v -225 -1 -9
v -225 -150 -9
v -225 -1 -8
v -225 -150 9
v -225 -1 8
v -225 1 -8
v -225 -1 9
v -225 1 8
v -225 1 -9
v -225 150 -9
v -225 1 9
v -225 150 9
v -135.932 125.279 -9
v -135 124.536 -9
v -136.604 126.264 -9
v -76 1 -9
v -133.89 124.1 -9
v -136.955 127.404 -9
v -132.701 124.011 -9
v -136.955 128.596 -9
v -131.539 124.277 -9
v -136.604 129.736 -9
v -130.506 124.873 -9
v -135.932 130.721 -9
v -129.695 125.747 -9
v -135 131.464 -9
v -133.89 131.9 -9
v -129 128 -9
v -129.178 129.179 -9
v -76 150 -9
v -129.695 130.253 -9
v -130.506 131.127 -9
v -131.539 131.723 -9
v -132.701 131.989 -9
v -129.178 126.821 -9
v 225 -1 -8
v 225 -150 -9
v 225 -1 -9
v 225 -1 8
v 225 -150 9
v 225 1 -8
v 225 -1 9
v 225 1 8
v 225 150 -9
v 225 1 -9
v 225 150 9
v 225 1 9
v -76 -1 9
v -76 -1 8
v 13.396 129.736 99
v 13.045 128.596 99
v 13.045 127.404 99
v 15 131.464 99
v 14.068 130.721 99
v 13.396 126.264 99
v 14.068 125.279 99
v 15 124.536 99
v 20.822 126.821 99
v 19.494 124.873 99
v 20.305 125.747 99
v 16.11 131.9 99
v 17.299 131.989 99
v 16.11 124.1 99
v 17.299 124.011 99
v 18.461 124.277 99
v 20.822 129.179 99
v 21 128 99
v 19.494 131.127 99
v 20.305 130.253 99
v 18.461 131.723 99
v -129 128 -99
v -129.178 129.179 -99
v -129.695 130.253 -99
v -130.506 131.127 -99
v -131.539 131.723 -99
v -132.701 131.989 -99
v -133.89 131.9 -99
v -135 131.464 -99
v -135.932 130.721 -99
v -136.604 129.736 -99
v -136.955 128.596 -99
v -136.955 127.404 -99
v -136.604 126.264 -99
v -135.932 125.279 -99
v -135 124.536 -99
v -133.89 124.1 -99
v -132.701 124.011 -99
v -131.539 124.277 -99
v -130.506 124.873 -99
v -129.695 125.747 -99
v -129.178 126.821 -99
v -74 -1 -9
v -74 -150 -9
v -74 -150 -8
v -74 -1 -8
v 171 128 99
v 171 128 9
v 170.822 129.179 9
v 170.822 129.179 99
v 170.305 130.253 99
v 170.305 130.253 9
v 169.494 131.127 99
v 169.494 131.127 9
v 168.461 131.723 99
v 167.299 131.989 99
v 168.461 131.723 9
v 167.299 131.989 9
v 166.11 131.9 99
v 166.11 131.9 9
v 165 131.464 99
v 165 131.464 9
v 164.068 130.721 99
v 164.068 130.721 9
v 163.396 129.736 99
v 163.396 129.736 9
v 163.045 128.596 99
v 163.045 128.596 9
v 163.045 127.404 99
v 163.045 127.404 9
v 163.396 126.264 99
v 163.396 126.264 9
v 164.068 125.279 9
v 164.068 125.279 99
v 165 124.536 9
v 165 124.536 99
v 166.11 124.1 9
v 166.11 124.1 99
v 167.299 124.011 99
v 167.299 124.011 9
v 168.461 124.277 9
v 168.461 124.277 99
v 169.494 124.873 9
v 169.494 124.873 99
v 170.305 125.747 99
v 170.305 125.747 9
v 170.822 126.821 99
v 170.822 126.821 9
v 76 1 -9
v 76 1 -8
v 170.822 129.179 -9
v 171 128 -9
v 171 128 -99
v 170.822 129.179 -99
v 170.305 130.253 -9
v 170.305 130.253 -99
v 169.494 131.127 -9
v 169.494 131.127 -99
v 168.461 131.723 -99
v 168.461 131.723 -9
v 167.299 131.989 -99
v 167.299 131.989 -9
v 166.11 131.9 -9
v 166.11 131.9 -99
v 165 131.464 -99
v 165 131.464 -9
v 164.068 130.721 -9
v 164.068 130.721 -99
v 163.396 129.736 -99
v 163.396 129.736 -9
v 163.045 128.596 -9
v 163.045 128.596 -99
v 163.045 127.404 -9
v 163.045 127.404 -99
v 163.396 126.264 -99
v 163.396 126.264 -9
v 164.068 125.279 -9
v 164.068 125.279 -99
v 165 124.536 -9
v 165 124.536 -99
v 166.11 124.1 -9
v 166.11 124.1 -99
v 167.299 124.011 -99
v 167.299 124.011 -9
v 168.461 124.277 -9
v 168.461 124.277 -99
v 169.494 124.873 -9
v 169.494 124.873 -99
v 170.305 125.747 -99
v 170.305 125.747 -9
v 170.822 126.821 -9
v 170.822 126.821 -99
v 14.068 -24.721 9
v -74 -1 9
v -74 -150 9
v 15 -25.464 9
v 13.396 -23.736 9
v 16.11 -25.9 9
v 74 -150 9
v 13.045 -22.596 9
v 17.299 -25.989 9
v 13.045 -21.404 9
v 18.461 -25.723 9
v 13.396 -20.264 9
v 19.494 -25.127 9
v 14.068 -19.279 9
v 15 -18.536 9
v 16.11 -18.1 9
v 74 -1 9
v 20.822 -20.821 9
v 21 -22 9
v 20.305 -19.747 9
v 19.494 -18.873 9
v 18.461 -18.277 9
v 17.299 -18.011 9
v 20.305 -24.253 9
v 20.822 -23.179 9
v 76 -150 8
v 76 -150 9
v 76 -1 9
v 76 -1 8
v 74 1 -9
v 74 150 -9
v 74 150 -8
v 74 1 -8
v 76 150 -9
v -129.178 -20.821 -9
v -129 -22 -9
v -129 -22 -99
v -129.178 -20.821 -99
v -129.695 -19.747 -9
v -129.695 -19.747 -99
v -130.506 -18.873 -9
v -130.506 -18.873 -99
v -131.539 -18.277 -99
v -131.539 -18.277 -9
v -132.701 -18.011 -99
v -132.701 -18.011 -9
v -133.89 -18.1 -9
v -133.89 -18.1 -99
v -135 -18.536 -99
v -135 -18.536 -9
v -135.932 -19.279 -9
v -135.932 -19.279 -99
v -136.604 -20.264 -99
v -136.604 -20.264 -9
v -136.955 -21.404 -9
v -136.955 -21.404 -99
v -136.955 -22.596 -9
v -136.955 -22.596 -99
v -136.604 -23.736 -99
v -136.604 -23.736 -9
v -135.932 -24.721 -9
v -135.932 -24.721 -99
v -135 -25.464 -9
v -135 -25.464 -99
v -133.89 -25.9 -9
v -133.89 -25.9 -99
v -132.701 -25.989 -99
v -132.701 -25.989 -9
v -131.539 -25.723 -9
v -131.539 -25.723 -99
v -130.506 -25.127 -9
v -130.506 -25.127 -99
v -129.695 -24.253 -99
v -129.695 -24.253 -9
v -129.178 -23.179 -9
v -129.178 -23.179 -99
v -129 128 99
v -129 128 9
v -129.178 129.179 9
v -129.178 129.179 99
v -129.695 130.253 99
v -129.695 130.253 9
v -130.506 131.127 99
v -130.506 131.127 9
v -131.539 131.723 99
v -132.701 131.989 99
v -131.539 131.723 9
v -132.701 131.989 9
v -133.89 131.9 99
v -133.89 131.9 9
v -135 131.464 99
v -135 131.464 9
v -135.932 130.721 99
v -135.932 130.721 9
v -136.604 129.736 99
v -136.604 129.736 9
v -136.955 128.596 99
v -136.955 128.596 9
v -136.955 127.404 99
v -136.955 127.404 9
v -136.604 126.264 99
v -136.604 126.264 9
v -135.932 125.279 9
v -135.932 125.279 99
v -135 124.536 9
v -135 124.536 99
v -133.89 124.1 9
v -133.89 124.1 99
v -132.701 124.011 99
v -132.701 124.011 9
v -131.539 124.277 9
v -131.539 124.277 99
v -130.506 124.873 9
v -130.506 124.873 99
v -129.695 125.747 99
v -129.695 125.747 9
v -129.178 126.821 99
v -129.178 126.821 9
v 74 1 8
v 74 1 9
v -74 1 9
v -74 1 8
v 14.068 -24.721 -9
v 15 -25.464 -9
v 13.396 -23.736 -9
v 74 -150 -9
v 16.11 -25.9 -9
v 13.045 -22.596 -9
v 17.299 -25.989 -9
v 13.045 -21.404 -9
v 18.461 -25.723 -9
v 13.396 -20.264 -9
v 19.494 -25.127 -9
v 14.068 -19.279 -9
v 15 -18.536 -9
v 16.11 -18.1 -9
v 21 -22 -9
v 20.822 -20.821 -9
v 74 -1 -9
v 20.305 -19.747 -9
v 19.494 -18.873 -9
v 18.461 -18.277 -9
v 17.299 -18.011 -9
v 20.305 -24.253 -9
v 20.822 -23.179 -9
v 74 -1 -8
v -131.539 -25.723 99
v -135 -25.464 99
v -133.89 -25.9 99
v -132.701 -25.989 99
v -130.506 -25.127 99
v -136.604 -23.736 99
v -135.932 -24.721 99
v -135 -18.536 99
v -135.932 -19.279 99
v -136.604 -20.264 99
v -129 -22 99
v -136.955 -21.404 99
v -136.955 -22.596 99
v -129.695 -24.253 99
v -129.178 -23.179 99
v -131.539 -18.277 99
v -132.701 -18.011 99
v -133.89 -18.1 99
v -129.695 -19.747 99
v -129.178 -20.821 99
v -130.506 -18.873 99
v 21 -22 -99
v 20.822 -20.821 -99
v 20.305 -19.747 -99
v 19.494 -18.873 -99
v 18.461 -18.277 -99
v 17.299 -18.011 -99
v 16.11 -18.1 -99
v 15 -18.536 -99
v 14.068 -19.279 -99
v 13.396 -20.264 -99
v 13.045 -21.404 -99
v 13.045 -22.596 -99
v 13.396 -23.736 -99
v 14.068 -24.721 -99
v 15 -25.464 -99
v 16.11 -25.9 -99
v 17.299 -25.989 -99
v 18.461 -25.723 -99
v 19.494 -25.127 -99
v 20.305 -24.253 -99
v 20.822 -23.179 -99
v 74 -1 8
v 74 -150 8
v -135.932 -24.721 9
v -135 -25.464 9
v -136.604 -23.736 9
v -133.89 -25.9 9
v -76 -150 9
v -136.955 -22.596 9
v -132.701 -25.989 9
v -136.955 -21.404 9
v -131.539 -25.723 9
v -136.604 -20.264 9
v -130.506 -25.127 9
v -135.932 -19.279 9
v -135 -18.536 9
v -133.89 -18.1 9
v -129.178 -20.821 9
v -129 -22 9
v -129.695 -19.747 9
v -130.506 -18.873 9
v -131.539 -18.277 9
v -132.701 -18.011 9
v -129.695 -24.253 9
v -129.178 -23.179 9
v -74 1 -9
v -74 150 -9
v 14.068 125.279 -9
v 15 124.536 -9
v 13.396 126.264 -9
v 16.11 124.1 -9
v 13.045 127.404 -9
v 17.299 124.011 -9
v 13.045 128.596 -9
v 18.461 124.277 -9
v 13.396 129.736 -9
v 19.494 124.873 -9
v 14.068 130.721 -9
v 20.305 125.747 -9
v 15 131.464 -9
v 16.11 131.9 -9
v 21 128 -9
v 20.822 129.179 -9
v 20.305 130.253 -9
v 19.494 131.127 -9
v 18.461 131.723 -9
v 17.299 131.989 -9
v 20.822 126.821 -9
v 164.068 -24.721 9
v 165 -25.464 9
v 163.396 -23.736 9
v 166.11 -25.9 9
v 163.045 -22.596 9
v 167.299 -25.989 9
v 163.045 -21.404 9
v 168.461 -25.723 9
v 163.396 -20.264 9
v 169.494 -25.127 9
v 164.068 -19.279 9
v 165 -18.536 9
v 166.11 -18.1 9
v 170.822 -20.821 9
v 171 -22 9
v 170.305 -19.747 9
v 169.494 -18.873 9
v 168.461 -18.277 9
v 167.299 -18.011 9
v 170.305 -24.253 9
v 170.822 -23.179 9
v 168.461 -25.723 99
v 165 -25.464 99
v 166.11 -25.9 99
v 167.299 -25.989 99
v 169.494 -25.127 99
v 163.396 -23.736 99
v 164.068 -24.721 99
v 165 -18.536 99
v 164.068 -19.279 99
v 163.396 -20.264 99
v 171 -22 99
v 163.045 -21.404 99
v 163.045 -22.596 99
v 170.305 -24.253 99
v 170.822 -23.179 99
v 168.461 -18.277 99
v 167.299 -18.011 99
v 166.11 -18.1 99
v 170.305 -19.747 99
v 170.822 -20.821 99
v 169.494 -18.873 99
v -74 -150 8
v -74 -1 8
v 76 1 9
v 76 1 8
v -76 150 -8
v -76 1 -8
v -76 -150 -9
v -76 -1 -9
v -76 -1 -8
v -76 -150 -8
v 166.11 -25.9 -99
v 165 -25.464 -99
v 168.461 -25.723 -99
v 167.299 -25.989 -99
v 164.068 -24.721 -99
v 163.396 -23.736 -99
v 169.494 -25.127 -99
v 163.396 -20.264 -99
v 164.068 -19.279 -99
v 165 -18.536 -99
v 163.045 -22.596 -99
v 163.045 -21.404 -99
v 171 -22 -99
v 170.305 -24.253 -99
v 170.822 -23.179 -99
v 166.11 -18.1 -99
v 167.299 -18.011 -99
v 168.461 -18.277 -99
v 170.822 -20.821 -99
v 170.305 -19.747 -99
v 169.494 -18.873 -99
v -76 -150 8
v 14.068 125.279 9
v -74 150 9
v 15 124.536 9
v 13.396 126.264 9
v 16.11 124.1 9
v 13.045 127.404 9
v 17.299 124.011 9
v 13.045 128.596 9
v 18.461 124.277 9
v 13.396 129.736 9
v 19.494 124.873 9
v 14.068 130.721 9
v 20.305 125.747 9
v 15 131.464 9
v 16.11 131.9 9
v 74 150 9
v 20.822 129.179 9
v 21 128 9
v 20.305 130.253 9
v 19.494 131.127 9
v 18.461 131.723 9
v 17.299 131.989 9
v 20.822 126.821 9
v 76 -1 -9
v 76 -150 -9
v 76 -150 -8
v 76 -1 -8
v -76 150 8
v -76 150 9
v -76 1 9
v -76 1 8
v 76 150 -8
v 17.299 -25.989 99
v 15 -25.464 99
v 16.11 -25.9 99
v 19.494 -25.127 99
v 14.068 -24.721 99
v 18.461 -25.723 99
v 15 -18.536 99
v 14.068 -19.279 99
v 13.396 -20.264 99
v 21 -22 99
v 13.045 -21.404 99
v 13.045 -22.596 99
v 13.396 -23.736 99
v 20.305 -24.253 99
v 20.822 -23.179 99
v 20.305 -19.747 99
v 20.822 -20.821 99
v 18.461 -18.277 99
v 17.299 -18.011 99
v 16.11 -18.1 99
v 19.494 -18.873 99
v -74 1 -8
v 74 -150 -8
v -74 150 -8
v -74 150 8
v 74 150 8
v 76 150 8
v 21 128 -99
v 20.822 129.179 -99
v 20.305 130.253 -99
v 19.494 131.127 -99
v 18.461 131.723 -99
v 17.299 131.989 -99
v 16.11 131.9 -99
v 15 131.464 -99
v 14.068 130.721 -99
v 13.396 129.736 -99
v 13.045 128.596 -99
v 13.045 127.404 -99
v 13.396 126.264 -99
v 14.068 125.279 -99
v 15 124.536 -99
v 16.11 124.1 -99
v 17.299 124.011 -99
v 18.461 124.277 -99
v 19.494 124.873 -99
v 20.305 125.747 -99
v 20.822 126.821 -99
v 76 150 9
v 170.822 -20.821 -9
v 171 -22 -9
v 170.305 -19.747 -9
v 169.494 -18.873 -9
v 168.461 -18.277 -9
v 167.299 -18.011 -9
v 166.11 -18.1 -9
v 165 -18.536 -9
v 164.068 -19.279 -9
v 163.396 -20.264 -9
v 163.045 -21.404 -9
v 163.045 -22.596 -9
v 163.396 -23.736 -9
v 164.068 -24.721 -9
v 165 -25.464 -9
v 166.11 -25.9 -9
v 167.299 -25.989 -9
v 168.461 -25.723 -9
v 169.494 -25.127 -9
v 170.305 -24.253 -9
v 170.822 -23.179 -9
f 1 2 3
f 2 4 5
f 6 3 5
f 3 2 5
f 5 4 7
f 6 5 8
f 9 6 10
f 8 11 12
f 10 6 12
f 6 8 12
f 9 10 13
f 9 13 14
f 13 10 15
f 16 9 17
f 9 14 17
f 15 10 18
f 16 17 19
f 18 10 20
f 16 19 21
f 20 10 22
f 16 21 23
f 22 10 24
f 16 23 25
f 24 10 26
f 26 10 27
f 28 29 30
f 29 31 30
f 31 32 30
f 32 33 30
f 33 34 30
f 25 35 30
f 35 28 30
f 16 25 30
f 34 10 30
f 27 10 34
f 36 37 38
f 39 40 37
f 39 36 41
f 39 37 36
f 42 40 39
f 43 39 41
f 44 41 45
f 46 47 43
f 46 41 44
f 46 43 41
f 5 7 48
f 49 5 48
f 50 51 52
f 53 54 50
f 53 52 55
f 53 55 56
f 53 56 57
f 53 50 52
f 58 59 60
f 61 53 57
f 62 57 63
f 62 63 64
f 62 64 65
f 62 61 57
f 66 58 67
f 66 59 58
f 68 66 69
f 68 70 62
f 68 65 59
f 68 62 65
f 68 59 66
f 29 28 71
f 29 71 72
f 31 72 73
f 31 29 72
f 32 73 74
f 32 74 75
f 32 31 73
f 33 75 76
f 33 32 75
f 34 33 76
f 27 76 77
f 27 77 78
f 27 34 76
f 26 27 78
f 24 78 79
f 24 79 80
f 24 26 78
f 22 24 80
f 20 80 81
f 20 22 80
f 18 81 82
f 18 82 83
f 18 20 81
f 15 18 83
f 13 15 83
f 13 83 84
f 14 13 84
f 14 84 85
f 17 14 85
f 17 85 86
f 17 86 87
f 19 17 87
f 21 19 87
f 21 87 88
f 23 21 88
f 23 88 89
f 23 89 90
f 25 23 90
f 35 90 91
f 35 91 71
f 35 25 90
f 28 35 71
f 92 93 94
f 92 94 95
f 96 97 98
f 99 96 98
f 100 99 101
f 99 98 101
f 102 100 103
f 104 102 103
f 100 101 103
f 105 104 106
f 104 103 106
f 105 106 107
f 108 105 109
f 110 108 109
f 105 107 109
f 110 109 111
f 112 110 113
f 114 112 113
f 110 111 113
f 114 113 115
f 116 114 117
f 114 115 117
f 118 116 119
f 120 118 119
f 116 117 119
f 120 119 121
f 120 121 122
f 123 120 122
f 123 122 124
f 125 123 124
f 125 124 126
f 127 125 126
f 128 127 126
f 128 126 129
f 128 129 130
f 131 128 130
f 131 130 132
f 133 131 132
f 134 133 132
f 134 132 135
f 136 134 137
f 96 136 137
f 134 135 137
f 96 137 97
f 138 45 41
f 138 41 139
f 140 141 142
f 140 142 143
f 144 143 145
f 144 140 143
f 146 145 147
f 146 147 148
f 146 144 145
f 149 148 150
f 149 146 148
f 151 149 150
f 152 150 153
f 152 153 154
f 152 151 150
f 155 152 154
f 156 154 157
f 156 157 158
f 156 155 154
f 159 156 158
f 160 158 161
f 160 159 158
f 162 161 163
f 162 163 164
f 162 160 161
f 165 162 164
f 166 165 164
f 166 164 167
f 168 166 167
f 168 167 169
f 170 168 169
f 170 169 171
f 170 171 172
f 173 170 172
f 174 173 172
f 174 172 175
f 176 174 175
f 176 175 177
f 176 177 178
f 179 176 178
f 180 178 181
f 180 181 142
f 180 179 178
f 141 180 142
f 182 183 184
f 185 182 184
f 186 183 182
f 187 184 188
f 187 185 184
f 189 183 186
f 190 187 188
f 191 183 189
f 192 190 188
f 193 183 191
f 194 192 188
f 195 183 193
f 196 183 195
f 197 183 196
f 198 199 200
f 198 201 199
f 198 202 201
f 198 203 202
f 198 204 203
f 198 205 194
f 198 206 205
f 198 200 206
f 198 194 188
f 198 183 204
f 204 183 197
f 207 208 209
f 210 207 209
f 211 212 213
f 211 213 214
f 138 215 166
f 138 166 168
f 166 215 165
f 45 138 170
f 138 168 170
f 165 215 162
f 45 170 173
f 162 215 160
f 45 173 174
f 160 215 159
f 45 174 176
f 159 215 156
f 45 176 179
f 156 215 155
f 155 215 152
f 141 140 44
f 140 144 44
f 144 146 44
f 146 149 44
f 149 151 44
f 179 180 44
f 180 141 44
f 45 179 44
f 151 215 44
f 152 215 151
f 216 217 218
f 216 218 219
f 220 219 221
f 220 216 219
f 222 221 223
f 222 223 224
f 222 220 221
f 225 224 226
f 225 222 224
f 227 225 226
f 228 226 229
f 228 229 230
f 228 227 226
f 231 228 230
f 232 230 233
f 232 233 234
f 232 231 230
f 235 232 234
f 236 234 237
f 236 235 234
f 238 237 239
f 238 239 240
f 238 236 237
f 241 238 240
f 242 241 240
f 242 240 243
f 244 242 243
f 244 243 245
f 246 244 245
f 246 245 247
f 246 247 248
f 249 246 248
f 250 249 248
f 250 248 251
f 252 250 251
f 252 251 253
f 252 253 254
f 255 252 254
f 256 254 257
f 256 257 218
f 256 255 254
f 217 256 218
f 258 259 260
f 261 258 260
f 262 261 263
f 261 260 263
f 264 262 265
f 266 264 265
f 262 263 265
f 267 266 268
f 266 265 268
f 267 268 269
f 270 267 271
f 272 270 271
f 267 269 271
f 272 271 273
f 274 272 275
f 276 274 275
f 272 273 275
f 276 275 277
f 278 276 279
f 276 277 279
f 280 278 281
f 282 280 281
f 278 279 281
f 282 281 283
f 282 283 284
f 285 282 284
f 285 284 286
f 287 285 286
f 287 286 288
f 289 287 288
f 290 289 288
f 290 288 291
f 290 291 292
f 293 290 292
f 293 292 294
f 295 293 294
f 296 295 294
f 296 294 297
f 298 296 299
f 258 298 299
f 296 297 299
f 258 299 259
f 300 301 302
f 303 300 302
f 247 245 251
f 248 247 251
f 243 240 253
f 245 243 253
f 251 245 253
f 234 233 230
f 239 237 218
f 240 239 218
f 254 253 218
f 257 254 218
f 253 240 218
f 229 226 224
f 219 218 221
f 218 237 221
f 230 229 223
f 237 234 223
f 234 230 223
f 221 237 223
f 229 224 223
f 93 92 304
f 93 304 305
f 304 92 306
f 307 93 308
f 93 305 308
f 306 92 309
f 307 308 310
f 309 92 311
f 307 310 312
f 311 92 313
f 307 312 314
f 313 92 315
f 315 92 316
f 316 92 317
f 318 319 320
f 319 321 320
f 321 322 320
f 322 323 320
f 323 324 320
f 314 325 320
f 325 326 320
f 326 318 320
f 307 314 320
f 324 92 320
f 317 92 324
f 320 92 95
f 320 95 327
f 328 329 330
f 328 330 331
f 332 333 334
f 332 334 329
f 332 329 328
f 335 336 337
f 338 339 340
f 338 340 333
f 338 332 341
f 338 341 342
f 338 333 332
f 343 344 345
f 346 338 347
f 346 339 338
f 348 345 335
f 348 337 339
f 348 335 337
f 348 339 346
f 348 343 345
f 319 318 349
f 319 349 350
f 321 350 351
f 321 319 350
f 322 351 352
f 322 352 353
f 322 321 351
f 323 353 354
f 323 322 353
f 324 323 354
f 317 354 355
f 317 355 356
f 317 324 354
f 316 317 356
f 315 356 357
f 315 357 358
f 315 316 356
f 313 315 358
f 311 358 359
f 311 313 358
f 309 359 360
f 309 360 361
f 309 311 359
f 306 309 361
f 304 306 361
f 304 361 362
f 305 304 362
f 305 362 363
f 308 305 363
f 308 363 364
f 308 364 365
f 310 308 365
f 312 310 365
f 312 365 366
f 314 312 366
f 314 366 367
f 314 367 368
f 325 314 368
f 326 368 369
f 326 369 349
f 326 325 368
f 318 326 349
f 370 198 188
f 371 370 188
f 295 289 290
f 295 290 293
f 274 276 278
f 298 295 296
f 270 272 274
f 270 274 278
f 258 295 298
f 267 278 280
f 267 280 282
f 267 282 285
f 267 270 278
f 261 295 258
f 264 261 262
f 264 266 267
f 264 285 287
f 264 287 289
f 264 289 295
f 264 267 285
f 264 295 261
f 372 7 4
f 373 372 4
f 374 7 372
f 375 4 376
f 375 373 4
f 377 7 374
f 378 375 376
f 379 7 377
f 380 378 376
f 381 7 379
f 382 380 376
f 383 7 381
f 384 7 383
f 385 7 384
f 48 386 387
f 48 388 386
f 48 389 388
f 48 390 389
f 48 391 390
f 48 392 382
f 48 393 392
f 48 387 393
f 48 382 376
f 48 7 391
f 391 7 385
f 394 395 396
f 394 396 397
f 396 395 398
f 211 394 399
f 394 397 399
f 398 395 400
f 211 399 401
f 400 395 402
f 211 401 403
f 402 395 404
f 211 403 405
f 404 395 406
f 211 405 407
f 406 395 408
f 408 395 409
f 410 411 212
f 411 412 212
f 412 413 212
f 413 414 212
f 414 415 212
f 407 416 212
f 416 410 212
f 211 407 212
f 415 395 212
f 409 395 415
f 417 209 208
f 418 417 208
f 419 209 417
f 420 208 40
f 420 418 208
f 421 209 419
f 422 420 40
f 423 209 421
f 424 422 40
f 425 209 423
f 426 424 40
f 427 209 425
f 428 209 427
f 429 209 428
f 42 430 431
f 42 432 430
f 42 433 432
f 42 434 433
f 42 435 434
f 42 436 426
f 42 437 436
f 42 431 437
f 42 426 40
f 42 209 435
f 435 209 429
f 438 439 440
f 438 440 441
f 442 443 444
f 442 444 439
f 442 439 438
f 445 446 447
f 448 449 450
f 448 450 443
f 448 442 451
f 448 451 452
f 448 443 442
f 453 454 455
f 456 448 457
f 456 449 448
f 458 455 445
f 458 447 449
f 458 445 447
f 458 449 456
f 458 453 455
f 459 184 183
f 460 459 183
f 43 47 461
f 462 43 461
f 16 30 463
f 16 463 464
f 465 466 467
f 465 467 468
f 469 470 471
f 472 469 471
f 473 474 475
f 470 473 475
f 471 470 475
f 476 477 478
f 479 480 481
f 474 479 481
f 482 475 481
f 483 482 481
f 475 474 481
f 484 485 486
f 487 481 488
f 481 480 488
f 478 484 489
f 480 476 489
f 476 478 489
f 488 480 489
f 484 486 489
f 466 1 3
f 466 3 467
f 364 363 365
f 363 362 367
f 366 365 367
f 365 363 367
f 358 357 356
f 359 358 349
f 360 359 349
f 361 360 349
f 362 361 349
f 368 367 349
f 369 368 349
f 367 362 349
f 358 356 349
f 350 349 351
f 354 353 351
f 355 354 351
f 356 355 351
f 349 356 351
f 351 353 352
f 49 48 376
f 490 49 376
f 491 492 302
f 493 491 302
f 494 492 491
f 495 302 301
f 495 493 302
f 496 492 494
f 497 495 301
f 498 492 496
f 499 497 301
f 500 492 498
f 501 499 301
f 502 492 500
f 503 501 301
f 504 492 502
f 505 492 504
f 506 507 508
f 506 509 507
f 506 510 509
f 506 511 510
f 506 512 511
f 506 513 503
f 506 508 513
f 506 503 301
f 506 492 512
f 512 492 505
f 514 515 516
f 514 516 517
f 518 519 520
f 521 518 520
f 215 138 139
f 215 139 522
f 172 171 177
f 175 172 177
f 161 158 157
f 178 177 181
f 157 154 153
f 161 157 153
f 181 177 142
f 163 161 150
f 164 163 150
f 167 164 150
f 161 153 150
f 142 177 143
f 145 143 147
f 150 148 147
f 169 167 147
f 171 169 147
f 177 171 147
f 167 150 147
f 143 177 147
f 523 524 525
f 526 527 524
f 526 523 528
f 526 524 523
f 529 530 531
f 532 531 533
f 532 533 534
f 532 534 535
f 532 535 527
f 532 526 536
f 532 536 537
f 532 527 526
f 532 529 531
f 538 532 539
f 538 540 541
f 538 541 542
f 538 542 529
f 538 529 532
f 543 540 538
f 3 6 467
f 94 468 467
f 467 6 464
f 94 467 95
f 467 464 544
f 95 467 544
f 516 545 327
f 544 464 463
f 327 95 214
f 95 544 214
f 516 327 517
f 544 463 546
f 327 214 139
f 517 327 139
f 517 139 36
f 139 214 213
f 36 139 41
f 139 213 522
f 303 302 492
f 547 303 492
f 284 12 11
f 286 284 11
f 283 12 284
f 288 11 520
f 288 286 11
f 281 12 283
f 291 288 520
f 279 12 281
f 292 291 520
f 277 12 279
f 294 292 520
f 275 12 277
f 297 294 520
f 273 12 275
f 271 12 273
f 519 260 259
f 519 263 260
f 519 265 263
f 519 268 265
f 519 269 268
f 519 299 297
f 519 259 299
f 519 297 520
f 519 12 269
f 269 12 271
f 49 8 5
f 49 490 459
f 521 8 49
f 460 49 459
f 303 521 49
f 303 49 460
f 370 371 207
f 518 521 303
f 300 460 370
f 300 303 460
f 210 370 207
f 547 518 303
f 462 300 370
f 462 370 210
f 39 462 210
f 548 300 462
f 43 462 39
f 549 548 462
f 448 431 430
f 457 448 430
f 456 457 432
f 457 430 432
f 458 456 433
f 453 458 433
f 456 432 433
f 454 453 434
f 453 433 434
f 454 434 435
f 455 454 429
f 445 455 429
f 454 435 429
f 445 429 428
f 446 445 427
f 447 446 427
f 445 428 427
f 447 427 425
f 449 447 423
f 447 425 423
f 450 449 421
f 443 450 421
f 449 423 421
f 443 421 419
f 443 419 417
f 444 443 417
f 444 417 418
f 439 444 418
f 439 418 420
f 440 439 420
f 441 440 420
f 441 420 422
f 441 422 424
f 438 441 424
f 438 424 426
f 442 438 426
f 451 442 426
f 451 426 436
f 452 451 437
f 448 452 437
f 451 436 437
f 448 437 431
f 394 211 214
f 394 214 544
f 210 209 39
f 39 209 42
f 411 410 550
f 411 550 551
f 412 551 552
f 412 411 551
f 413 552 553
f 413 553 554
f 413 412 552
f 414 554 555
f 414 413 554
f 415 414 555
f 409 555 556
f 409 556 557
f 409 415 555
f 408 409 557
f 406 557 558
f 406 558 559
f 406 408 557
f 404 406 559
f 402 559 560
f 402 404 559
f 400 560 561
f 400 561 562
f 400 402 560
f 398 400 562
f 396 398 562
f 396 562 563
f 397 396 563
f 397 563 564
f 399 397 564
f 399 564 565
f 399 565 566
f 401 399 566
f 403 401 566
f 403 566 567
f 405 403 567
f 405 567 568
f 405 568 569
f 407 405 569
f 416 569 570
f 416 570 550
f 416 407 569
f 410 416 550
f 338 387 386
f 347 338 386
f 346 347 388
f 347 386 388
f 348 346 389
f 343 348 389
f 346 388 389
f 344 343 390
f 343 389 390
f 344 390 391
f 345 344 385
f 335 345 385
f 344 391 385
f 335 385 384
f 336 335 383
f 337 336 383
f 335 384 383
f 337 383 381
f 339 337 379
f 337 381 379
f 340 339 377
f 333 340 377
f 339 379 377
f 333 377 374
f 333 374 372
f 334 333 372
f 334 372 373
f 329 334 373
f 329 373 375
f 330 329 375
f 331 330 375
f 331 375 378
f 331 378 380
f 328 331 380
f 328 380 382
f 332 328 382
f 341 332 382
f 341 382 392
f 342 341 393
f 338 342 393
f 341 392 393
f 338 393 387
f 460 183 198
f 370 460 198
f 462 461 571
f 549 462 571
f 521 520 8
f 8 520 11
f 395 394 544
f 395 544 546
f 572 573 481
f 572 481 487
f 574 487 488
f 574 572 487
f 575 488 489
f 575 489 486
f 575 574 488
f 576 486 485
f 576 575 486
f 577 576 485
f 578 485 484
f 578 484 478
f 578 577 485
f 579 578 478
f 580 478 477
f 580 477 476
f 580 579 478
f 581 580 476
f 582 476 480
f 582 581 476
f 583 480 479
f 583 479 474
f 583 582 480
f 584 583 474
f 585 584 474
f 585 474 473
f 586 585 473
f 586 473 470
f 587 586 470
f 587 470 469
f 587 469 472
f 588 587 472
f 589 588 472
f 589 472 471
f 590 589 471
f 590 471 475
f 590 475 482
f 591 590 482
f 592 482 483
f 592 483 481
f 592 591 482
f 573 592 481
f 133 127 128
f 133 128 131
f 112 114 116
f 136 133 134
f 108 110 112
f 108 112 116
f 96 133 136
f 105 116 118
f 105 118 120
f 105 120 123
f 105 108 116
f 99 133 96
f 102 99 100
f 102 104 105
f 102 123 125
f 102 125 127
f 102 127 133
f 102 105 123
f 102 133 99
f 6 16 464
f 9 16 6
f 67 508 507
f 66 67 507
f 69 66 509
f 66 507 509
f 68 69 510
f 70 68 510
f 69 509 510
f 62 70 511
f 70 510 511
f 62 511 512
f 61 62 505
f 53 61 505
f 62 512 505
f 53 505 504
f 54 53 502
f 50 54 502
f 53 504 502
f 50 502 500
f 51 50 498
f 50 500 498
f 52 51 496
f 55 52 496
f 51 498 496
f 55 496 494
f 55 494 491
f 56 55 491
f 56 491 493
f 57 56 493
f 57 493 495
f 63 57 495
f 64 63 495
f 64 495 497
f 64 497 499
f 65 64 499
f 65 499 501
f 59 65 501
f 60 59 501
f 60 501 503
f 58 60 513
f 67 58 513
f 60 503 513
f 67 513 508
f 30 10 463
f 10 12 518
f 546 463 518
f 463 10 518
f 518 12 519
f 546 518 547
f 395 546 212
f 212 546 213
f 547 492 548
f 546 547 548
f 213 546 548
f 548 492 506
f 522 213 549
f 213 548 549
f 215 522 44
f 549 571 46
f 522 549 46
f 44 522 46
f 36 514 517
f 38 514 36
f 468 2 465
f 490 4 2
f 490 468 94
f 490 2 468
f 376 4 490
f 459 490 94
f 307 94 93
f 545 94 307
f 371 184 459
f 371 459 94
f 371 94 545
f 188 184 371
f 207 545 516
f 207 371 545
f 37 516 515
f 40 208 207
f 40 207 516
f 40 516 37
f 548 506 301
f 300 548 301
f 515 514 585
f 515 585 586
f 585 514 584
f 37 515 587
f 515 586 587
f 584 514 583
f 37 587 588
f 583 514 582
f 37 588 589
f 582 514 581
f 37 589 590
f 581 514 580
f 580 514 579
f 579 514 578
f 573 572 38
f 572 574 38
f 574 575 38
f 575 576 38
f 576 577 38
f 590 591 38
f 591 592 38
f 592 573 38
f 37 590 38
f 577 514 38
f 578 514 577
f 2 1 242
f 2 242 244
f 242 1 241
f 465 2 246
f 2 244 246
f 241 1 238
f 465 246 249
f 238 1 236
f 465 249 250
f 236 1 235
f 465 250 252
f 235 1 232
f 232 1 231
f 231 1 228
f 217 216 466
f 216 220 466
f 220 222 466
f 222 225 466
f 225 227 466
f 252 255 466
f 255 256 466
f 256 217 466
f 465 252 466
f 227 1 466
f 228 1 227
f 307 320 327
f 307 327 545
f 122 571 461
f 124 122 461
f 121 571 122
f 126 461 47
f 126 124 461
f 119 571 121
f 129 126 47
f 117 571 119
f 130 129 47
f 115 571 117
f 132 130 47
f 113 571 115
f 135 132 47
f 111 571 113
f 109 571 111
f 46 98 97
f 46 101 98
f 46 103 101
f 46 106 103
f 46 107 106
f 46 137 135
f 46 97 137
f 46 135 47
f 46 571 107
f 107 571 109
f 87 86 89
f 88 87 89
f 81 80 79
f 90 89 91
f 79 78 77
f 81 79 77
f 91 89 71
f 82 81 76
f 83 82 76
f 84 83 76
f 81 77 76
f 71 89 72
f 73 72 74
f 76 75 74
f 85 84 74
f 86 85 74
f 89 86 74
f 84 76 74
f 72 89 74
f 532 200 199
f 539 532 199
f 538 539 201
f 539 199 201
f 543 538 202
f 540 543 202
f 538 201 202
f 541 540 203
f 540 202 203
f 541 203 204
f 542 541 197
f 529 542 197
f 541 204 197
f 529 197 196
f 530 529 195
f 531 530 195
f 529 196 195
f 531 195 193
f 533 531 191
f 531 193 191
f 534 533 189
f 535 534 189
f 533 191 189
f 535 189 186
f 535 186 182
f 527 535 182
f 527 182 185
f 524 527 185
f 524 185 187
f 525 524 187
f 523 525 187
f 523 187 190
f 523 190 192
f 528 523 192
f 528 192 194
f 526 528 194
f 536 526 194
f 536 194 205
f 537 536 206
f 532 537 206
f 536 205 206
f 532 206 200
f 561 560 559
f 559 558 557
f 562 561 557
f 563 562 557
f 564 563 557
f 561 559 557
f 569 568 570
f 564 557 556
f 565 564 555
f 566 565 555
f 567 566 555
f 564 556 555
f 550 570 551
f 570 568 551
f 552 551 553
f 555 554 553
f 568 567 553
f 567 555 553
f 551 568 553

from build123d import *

# Parameters (mm, degrees)
SKETCH1_W           = 450
SKETCH1_H           = 300
BOSS_EXTRUDE1_DEPTH = 9
CUT_EXTRUDE2_DEPTH  = 1
SKETCH5_R           = 4
BOSS_EXTRUDE3_DEPTH = 90


with BuildPart() as part:
    # Sketch1 → Boss-Extrude1 (new, symmetric)
    with BuildSketch(Plane.XY):
        Rectangle(SKETCH1_W, SKETCH1_H)
    extrude(amount=BOSS_EXTRUDE1_DEPTH, both=True)

    # Sketch3 → Cut-Extrude2 (cut)
    with BuildSketch(Plane.XY.offset(9)):
        Polygon((-225, 1), (-225, -1), (-76, -1), (-76, -150), (-74, -150), (-74, -1), (74, -1), (74, -150), (76, -150), (76, -1), (225, -1), (225, 1), (76, 1), (76, 150), (74, 150), (74, 1), (-74, 1), (-74, 150), (-76, 150), (-76, 1), align=None)
    cut_extrude2 = extrude(amount=-CUT_EXTRUDE2_DEPTH, mode=Mode.SUBTRACT)

    # Sketch5 → Boss-Extrude3 (add)
    with BuildSketch(Plane.XY.offset(9)):
        with Locations((-133, 128)):
            Circle(SKETCH5_R)
        with Locations((17, 128)):
            Circle(SKETCH5_R)
        with Locations((167, 128)):
            Circle(SKETCH5_R)
        with Locations((17, -22)):
            Circle(SKETCH5_R)
        with Locations((167, -22)):
            Circle(SKETCH5_R)
        with Locations((-133, -22)):
            Circle(SKETCH5_R)
    boss_extrude3 = extrude(amount=BOSS_EXTRUDE3_DEPTH)

    # Mirror1: Cut-Extrude2, Boss-Extrude3 across plane
    add(cut_extrude2.mirror(Plane.XY), mode=Mode.SUBTRACT)
    add(boss_extrude3.mirror(Plane.XY))


solid = part.part
